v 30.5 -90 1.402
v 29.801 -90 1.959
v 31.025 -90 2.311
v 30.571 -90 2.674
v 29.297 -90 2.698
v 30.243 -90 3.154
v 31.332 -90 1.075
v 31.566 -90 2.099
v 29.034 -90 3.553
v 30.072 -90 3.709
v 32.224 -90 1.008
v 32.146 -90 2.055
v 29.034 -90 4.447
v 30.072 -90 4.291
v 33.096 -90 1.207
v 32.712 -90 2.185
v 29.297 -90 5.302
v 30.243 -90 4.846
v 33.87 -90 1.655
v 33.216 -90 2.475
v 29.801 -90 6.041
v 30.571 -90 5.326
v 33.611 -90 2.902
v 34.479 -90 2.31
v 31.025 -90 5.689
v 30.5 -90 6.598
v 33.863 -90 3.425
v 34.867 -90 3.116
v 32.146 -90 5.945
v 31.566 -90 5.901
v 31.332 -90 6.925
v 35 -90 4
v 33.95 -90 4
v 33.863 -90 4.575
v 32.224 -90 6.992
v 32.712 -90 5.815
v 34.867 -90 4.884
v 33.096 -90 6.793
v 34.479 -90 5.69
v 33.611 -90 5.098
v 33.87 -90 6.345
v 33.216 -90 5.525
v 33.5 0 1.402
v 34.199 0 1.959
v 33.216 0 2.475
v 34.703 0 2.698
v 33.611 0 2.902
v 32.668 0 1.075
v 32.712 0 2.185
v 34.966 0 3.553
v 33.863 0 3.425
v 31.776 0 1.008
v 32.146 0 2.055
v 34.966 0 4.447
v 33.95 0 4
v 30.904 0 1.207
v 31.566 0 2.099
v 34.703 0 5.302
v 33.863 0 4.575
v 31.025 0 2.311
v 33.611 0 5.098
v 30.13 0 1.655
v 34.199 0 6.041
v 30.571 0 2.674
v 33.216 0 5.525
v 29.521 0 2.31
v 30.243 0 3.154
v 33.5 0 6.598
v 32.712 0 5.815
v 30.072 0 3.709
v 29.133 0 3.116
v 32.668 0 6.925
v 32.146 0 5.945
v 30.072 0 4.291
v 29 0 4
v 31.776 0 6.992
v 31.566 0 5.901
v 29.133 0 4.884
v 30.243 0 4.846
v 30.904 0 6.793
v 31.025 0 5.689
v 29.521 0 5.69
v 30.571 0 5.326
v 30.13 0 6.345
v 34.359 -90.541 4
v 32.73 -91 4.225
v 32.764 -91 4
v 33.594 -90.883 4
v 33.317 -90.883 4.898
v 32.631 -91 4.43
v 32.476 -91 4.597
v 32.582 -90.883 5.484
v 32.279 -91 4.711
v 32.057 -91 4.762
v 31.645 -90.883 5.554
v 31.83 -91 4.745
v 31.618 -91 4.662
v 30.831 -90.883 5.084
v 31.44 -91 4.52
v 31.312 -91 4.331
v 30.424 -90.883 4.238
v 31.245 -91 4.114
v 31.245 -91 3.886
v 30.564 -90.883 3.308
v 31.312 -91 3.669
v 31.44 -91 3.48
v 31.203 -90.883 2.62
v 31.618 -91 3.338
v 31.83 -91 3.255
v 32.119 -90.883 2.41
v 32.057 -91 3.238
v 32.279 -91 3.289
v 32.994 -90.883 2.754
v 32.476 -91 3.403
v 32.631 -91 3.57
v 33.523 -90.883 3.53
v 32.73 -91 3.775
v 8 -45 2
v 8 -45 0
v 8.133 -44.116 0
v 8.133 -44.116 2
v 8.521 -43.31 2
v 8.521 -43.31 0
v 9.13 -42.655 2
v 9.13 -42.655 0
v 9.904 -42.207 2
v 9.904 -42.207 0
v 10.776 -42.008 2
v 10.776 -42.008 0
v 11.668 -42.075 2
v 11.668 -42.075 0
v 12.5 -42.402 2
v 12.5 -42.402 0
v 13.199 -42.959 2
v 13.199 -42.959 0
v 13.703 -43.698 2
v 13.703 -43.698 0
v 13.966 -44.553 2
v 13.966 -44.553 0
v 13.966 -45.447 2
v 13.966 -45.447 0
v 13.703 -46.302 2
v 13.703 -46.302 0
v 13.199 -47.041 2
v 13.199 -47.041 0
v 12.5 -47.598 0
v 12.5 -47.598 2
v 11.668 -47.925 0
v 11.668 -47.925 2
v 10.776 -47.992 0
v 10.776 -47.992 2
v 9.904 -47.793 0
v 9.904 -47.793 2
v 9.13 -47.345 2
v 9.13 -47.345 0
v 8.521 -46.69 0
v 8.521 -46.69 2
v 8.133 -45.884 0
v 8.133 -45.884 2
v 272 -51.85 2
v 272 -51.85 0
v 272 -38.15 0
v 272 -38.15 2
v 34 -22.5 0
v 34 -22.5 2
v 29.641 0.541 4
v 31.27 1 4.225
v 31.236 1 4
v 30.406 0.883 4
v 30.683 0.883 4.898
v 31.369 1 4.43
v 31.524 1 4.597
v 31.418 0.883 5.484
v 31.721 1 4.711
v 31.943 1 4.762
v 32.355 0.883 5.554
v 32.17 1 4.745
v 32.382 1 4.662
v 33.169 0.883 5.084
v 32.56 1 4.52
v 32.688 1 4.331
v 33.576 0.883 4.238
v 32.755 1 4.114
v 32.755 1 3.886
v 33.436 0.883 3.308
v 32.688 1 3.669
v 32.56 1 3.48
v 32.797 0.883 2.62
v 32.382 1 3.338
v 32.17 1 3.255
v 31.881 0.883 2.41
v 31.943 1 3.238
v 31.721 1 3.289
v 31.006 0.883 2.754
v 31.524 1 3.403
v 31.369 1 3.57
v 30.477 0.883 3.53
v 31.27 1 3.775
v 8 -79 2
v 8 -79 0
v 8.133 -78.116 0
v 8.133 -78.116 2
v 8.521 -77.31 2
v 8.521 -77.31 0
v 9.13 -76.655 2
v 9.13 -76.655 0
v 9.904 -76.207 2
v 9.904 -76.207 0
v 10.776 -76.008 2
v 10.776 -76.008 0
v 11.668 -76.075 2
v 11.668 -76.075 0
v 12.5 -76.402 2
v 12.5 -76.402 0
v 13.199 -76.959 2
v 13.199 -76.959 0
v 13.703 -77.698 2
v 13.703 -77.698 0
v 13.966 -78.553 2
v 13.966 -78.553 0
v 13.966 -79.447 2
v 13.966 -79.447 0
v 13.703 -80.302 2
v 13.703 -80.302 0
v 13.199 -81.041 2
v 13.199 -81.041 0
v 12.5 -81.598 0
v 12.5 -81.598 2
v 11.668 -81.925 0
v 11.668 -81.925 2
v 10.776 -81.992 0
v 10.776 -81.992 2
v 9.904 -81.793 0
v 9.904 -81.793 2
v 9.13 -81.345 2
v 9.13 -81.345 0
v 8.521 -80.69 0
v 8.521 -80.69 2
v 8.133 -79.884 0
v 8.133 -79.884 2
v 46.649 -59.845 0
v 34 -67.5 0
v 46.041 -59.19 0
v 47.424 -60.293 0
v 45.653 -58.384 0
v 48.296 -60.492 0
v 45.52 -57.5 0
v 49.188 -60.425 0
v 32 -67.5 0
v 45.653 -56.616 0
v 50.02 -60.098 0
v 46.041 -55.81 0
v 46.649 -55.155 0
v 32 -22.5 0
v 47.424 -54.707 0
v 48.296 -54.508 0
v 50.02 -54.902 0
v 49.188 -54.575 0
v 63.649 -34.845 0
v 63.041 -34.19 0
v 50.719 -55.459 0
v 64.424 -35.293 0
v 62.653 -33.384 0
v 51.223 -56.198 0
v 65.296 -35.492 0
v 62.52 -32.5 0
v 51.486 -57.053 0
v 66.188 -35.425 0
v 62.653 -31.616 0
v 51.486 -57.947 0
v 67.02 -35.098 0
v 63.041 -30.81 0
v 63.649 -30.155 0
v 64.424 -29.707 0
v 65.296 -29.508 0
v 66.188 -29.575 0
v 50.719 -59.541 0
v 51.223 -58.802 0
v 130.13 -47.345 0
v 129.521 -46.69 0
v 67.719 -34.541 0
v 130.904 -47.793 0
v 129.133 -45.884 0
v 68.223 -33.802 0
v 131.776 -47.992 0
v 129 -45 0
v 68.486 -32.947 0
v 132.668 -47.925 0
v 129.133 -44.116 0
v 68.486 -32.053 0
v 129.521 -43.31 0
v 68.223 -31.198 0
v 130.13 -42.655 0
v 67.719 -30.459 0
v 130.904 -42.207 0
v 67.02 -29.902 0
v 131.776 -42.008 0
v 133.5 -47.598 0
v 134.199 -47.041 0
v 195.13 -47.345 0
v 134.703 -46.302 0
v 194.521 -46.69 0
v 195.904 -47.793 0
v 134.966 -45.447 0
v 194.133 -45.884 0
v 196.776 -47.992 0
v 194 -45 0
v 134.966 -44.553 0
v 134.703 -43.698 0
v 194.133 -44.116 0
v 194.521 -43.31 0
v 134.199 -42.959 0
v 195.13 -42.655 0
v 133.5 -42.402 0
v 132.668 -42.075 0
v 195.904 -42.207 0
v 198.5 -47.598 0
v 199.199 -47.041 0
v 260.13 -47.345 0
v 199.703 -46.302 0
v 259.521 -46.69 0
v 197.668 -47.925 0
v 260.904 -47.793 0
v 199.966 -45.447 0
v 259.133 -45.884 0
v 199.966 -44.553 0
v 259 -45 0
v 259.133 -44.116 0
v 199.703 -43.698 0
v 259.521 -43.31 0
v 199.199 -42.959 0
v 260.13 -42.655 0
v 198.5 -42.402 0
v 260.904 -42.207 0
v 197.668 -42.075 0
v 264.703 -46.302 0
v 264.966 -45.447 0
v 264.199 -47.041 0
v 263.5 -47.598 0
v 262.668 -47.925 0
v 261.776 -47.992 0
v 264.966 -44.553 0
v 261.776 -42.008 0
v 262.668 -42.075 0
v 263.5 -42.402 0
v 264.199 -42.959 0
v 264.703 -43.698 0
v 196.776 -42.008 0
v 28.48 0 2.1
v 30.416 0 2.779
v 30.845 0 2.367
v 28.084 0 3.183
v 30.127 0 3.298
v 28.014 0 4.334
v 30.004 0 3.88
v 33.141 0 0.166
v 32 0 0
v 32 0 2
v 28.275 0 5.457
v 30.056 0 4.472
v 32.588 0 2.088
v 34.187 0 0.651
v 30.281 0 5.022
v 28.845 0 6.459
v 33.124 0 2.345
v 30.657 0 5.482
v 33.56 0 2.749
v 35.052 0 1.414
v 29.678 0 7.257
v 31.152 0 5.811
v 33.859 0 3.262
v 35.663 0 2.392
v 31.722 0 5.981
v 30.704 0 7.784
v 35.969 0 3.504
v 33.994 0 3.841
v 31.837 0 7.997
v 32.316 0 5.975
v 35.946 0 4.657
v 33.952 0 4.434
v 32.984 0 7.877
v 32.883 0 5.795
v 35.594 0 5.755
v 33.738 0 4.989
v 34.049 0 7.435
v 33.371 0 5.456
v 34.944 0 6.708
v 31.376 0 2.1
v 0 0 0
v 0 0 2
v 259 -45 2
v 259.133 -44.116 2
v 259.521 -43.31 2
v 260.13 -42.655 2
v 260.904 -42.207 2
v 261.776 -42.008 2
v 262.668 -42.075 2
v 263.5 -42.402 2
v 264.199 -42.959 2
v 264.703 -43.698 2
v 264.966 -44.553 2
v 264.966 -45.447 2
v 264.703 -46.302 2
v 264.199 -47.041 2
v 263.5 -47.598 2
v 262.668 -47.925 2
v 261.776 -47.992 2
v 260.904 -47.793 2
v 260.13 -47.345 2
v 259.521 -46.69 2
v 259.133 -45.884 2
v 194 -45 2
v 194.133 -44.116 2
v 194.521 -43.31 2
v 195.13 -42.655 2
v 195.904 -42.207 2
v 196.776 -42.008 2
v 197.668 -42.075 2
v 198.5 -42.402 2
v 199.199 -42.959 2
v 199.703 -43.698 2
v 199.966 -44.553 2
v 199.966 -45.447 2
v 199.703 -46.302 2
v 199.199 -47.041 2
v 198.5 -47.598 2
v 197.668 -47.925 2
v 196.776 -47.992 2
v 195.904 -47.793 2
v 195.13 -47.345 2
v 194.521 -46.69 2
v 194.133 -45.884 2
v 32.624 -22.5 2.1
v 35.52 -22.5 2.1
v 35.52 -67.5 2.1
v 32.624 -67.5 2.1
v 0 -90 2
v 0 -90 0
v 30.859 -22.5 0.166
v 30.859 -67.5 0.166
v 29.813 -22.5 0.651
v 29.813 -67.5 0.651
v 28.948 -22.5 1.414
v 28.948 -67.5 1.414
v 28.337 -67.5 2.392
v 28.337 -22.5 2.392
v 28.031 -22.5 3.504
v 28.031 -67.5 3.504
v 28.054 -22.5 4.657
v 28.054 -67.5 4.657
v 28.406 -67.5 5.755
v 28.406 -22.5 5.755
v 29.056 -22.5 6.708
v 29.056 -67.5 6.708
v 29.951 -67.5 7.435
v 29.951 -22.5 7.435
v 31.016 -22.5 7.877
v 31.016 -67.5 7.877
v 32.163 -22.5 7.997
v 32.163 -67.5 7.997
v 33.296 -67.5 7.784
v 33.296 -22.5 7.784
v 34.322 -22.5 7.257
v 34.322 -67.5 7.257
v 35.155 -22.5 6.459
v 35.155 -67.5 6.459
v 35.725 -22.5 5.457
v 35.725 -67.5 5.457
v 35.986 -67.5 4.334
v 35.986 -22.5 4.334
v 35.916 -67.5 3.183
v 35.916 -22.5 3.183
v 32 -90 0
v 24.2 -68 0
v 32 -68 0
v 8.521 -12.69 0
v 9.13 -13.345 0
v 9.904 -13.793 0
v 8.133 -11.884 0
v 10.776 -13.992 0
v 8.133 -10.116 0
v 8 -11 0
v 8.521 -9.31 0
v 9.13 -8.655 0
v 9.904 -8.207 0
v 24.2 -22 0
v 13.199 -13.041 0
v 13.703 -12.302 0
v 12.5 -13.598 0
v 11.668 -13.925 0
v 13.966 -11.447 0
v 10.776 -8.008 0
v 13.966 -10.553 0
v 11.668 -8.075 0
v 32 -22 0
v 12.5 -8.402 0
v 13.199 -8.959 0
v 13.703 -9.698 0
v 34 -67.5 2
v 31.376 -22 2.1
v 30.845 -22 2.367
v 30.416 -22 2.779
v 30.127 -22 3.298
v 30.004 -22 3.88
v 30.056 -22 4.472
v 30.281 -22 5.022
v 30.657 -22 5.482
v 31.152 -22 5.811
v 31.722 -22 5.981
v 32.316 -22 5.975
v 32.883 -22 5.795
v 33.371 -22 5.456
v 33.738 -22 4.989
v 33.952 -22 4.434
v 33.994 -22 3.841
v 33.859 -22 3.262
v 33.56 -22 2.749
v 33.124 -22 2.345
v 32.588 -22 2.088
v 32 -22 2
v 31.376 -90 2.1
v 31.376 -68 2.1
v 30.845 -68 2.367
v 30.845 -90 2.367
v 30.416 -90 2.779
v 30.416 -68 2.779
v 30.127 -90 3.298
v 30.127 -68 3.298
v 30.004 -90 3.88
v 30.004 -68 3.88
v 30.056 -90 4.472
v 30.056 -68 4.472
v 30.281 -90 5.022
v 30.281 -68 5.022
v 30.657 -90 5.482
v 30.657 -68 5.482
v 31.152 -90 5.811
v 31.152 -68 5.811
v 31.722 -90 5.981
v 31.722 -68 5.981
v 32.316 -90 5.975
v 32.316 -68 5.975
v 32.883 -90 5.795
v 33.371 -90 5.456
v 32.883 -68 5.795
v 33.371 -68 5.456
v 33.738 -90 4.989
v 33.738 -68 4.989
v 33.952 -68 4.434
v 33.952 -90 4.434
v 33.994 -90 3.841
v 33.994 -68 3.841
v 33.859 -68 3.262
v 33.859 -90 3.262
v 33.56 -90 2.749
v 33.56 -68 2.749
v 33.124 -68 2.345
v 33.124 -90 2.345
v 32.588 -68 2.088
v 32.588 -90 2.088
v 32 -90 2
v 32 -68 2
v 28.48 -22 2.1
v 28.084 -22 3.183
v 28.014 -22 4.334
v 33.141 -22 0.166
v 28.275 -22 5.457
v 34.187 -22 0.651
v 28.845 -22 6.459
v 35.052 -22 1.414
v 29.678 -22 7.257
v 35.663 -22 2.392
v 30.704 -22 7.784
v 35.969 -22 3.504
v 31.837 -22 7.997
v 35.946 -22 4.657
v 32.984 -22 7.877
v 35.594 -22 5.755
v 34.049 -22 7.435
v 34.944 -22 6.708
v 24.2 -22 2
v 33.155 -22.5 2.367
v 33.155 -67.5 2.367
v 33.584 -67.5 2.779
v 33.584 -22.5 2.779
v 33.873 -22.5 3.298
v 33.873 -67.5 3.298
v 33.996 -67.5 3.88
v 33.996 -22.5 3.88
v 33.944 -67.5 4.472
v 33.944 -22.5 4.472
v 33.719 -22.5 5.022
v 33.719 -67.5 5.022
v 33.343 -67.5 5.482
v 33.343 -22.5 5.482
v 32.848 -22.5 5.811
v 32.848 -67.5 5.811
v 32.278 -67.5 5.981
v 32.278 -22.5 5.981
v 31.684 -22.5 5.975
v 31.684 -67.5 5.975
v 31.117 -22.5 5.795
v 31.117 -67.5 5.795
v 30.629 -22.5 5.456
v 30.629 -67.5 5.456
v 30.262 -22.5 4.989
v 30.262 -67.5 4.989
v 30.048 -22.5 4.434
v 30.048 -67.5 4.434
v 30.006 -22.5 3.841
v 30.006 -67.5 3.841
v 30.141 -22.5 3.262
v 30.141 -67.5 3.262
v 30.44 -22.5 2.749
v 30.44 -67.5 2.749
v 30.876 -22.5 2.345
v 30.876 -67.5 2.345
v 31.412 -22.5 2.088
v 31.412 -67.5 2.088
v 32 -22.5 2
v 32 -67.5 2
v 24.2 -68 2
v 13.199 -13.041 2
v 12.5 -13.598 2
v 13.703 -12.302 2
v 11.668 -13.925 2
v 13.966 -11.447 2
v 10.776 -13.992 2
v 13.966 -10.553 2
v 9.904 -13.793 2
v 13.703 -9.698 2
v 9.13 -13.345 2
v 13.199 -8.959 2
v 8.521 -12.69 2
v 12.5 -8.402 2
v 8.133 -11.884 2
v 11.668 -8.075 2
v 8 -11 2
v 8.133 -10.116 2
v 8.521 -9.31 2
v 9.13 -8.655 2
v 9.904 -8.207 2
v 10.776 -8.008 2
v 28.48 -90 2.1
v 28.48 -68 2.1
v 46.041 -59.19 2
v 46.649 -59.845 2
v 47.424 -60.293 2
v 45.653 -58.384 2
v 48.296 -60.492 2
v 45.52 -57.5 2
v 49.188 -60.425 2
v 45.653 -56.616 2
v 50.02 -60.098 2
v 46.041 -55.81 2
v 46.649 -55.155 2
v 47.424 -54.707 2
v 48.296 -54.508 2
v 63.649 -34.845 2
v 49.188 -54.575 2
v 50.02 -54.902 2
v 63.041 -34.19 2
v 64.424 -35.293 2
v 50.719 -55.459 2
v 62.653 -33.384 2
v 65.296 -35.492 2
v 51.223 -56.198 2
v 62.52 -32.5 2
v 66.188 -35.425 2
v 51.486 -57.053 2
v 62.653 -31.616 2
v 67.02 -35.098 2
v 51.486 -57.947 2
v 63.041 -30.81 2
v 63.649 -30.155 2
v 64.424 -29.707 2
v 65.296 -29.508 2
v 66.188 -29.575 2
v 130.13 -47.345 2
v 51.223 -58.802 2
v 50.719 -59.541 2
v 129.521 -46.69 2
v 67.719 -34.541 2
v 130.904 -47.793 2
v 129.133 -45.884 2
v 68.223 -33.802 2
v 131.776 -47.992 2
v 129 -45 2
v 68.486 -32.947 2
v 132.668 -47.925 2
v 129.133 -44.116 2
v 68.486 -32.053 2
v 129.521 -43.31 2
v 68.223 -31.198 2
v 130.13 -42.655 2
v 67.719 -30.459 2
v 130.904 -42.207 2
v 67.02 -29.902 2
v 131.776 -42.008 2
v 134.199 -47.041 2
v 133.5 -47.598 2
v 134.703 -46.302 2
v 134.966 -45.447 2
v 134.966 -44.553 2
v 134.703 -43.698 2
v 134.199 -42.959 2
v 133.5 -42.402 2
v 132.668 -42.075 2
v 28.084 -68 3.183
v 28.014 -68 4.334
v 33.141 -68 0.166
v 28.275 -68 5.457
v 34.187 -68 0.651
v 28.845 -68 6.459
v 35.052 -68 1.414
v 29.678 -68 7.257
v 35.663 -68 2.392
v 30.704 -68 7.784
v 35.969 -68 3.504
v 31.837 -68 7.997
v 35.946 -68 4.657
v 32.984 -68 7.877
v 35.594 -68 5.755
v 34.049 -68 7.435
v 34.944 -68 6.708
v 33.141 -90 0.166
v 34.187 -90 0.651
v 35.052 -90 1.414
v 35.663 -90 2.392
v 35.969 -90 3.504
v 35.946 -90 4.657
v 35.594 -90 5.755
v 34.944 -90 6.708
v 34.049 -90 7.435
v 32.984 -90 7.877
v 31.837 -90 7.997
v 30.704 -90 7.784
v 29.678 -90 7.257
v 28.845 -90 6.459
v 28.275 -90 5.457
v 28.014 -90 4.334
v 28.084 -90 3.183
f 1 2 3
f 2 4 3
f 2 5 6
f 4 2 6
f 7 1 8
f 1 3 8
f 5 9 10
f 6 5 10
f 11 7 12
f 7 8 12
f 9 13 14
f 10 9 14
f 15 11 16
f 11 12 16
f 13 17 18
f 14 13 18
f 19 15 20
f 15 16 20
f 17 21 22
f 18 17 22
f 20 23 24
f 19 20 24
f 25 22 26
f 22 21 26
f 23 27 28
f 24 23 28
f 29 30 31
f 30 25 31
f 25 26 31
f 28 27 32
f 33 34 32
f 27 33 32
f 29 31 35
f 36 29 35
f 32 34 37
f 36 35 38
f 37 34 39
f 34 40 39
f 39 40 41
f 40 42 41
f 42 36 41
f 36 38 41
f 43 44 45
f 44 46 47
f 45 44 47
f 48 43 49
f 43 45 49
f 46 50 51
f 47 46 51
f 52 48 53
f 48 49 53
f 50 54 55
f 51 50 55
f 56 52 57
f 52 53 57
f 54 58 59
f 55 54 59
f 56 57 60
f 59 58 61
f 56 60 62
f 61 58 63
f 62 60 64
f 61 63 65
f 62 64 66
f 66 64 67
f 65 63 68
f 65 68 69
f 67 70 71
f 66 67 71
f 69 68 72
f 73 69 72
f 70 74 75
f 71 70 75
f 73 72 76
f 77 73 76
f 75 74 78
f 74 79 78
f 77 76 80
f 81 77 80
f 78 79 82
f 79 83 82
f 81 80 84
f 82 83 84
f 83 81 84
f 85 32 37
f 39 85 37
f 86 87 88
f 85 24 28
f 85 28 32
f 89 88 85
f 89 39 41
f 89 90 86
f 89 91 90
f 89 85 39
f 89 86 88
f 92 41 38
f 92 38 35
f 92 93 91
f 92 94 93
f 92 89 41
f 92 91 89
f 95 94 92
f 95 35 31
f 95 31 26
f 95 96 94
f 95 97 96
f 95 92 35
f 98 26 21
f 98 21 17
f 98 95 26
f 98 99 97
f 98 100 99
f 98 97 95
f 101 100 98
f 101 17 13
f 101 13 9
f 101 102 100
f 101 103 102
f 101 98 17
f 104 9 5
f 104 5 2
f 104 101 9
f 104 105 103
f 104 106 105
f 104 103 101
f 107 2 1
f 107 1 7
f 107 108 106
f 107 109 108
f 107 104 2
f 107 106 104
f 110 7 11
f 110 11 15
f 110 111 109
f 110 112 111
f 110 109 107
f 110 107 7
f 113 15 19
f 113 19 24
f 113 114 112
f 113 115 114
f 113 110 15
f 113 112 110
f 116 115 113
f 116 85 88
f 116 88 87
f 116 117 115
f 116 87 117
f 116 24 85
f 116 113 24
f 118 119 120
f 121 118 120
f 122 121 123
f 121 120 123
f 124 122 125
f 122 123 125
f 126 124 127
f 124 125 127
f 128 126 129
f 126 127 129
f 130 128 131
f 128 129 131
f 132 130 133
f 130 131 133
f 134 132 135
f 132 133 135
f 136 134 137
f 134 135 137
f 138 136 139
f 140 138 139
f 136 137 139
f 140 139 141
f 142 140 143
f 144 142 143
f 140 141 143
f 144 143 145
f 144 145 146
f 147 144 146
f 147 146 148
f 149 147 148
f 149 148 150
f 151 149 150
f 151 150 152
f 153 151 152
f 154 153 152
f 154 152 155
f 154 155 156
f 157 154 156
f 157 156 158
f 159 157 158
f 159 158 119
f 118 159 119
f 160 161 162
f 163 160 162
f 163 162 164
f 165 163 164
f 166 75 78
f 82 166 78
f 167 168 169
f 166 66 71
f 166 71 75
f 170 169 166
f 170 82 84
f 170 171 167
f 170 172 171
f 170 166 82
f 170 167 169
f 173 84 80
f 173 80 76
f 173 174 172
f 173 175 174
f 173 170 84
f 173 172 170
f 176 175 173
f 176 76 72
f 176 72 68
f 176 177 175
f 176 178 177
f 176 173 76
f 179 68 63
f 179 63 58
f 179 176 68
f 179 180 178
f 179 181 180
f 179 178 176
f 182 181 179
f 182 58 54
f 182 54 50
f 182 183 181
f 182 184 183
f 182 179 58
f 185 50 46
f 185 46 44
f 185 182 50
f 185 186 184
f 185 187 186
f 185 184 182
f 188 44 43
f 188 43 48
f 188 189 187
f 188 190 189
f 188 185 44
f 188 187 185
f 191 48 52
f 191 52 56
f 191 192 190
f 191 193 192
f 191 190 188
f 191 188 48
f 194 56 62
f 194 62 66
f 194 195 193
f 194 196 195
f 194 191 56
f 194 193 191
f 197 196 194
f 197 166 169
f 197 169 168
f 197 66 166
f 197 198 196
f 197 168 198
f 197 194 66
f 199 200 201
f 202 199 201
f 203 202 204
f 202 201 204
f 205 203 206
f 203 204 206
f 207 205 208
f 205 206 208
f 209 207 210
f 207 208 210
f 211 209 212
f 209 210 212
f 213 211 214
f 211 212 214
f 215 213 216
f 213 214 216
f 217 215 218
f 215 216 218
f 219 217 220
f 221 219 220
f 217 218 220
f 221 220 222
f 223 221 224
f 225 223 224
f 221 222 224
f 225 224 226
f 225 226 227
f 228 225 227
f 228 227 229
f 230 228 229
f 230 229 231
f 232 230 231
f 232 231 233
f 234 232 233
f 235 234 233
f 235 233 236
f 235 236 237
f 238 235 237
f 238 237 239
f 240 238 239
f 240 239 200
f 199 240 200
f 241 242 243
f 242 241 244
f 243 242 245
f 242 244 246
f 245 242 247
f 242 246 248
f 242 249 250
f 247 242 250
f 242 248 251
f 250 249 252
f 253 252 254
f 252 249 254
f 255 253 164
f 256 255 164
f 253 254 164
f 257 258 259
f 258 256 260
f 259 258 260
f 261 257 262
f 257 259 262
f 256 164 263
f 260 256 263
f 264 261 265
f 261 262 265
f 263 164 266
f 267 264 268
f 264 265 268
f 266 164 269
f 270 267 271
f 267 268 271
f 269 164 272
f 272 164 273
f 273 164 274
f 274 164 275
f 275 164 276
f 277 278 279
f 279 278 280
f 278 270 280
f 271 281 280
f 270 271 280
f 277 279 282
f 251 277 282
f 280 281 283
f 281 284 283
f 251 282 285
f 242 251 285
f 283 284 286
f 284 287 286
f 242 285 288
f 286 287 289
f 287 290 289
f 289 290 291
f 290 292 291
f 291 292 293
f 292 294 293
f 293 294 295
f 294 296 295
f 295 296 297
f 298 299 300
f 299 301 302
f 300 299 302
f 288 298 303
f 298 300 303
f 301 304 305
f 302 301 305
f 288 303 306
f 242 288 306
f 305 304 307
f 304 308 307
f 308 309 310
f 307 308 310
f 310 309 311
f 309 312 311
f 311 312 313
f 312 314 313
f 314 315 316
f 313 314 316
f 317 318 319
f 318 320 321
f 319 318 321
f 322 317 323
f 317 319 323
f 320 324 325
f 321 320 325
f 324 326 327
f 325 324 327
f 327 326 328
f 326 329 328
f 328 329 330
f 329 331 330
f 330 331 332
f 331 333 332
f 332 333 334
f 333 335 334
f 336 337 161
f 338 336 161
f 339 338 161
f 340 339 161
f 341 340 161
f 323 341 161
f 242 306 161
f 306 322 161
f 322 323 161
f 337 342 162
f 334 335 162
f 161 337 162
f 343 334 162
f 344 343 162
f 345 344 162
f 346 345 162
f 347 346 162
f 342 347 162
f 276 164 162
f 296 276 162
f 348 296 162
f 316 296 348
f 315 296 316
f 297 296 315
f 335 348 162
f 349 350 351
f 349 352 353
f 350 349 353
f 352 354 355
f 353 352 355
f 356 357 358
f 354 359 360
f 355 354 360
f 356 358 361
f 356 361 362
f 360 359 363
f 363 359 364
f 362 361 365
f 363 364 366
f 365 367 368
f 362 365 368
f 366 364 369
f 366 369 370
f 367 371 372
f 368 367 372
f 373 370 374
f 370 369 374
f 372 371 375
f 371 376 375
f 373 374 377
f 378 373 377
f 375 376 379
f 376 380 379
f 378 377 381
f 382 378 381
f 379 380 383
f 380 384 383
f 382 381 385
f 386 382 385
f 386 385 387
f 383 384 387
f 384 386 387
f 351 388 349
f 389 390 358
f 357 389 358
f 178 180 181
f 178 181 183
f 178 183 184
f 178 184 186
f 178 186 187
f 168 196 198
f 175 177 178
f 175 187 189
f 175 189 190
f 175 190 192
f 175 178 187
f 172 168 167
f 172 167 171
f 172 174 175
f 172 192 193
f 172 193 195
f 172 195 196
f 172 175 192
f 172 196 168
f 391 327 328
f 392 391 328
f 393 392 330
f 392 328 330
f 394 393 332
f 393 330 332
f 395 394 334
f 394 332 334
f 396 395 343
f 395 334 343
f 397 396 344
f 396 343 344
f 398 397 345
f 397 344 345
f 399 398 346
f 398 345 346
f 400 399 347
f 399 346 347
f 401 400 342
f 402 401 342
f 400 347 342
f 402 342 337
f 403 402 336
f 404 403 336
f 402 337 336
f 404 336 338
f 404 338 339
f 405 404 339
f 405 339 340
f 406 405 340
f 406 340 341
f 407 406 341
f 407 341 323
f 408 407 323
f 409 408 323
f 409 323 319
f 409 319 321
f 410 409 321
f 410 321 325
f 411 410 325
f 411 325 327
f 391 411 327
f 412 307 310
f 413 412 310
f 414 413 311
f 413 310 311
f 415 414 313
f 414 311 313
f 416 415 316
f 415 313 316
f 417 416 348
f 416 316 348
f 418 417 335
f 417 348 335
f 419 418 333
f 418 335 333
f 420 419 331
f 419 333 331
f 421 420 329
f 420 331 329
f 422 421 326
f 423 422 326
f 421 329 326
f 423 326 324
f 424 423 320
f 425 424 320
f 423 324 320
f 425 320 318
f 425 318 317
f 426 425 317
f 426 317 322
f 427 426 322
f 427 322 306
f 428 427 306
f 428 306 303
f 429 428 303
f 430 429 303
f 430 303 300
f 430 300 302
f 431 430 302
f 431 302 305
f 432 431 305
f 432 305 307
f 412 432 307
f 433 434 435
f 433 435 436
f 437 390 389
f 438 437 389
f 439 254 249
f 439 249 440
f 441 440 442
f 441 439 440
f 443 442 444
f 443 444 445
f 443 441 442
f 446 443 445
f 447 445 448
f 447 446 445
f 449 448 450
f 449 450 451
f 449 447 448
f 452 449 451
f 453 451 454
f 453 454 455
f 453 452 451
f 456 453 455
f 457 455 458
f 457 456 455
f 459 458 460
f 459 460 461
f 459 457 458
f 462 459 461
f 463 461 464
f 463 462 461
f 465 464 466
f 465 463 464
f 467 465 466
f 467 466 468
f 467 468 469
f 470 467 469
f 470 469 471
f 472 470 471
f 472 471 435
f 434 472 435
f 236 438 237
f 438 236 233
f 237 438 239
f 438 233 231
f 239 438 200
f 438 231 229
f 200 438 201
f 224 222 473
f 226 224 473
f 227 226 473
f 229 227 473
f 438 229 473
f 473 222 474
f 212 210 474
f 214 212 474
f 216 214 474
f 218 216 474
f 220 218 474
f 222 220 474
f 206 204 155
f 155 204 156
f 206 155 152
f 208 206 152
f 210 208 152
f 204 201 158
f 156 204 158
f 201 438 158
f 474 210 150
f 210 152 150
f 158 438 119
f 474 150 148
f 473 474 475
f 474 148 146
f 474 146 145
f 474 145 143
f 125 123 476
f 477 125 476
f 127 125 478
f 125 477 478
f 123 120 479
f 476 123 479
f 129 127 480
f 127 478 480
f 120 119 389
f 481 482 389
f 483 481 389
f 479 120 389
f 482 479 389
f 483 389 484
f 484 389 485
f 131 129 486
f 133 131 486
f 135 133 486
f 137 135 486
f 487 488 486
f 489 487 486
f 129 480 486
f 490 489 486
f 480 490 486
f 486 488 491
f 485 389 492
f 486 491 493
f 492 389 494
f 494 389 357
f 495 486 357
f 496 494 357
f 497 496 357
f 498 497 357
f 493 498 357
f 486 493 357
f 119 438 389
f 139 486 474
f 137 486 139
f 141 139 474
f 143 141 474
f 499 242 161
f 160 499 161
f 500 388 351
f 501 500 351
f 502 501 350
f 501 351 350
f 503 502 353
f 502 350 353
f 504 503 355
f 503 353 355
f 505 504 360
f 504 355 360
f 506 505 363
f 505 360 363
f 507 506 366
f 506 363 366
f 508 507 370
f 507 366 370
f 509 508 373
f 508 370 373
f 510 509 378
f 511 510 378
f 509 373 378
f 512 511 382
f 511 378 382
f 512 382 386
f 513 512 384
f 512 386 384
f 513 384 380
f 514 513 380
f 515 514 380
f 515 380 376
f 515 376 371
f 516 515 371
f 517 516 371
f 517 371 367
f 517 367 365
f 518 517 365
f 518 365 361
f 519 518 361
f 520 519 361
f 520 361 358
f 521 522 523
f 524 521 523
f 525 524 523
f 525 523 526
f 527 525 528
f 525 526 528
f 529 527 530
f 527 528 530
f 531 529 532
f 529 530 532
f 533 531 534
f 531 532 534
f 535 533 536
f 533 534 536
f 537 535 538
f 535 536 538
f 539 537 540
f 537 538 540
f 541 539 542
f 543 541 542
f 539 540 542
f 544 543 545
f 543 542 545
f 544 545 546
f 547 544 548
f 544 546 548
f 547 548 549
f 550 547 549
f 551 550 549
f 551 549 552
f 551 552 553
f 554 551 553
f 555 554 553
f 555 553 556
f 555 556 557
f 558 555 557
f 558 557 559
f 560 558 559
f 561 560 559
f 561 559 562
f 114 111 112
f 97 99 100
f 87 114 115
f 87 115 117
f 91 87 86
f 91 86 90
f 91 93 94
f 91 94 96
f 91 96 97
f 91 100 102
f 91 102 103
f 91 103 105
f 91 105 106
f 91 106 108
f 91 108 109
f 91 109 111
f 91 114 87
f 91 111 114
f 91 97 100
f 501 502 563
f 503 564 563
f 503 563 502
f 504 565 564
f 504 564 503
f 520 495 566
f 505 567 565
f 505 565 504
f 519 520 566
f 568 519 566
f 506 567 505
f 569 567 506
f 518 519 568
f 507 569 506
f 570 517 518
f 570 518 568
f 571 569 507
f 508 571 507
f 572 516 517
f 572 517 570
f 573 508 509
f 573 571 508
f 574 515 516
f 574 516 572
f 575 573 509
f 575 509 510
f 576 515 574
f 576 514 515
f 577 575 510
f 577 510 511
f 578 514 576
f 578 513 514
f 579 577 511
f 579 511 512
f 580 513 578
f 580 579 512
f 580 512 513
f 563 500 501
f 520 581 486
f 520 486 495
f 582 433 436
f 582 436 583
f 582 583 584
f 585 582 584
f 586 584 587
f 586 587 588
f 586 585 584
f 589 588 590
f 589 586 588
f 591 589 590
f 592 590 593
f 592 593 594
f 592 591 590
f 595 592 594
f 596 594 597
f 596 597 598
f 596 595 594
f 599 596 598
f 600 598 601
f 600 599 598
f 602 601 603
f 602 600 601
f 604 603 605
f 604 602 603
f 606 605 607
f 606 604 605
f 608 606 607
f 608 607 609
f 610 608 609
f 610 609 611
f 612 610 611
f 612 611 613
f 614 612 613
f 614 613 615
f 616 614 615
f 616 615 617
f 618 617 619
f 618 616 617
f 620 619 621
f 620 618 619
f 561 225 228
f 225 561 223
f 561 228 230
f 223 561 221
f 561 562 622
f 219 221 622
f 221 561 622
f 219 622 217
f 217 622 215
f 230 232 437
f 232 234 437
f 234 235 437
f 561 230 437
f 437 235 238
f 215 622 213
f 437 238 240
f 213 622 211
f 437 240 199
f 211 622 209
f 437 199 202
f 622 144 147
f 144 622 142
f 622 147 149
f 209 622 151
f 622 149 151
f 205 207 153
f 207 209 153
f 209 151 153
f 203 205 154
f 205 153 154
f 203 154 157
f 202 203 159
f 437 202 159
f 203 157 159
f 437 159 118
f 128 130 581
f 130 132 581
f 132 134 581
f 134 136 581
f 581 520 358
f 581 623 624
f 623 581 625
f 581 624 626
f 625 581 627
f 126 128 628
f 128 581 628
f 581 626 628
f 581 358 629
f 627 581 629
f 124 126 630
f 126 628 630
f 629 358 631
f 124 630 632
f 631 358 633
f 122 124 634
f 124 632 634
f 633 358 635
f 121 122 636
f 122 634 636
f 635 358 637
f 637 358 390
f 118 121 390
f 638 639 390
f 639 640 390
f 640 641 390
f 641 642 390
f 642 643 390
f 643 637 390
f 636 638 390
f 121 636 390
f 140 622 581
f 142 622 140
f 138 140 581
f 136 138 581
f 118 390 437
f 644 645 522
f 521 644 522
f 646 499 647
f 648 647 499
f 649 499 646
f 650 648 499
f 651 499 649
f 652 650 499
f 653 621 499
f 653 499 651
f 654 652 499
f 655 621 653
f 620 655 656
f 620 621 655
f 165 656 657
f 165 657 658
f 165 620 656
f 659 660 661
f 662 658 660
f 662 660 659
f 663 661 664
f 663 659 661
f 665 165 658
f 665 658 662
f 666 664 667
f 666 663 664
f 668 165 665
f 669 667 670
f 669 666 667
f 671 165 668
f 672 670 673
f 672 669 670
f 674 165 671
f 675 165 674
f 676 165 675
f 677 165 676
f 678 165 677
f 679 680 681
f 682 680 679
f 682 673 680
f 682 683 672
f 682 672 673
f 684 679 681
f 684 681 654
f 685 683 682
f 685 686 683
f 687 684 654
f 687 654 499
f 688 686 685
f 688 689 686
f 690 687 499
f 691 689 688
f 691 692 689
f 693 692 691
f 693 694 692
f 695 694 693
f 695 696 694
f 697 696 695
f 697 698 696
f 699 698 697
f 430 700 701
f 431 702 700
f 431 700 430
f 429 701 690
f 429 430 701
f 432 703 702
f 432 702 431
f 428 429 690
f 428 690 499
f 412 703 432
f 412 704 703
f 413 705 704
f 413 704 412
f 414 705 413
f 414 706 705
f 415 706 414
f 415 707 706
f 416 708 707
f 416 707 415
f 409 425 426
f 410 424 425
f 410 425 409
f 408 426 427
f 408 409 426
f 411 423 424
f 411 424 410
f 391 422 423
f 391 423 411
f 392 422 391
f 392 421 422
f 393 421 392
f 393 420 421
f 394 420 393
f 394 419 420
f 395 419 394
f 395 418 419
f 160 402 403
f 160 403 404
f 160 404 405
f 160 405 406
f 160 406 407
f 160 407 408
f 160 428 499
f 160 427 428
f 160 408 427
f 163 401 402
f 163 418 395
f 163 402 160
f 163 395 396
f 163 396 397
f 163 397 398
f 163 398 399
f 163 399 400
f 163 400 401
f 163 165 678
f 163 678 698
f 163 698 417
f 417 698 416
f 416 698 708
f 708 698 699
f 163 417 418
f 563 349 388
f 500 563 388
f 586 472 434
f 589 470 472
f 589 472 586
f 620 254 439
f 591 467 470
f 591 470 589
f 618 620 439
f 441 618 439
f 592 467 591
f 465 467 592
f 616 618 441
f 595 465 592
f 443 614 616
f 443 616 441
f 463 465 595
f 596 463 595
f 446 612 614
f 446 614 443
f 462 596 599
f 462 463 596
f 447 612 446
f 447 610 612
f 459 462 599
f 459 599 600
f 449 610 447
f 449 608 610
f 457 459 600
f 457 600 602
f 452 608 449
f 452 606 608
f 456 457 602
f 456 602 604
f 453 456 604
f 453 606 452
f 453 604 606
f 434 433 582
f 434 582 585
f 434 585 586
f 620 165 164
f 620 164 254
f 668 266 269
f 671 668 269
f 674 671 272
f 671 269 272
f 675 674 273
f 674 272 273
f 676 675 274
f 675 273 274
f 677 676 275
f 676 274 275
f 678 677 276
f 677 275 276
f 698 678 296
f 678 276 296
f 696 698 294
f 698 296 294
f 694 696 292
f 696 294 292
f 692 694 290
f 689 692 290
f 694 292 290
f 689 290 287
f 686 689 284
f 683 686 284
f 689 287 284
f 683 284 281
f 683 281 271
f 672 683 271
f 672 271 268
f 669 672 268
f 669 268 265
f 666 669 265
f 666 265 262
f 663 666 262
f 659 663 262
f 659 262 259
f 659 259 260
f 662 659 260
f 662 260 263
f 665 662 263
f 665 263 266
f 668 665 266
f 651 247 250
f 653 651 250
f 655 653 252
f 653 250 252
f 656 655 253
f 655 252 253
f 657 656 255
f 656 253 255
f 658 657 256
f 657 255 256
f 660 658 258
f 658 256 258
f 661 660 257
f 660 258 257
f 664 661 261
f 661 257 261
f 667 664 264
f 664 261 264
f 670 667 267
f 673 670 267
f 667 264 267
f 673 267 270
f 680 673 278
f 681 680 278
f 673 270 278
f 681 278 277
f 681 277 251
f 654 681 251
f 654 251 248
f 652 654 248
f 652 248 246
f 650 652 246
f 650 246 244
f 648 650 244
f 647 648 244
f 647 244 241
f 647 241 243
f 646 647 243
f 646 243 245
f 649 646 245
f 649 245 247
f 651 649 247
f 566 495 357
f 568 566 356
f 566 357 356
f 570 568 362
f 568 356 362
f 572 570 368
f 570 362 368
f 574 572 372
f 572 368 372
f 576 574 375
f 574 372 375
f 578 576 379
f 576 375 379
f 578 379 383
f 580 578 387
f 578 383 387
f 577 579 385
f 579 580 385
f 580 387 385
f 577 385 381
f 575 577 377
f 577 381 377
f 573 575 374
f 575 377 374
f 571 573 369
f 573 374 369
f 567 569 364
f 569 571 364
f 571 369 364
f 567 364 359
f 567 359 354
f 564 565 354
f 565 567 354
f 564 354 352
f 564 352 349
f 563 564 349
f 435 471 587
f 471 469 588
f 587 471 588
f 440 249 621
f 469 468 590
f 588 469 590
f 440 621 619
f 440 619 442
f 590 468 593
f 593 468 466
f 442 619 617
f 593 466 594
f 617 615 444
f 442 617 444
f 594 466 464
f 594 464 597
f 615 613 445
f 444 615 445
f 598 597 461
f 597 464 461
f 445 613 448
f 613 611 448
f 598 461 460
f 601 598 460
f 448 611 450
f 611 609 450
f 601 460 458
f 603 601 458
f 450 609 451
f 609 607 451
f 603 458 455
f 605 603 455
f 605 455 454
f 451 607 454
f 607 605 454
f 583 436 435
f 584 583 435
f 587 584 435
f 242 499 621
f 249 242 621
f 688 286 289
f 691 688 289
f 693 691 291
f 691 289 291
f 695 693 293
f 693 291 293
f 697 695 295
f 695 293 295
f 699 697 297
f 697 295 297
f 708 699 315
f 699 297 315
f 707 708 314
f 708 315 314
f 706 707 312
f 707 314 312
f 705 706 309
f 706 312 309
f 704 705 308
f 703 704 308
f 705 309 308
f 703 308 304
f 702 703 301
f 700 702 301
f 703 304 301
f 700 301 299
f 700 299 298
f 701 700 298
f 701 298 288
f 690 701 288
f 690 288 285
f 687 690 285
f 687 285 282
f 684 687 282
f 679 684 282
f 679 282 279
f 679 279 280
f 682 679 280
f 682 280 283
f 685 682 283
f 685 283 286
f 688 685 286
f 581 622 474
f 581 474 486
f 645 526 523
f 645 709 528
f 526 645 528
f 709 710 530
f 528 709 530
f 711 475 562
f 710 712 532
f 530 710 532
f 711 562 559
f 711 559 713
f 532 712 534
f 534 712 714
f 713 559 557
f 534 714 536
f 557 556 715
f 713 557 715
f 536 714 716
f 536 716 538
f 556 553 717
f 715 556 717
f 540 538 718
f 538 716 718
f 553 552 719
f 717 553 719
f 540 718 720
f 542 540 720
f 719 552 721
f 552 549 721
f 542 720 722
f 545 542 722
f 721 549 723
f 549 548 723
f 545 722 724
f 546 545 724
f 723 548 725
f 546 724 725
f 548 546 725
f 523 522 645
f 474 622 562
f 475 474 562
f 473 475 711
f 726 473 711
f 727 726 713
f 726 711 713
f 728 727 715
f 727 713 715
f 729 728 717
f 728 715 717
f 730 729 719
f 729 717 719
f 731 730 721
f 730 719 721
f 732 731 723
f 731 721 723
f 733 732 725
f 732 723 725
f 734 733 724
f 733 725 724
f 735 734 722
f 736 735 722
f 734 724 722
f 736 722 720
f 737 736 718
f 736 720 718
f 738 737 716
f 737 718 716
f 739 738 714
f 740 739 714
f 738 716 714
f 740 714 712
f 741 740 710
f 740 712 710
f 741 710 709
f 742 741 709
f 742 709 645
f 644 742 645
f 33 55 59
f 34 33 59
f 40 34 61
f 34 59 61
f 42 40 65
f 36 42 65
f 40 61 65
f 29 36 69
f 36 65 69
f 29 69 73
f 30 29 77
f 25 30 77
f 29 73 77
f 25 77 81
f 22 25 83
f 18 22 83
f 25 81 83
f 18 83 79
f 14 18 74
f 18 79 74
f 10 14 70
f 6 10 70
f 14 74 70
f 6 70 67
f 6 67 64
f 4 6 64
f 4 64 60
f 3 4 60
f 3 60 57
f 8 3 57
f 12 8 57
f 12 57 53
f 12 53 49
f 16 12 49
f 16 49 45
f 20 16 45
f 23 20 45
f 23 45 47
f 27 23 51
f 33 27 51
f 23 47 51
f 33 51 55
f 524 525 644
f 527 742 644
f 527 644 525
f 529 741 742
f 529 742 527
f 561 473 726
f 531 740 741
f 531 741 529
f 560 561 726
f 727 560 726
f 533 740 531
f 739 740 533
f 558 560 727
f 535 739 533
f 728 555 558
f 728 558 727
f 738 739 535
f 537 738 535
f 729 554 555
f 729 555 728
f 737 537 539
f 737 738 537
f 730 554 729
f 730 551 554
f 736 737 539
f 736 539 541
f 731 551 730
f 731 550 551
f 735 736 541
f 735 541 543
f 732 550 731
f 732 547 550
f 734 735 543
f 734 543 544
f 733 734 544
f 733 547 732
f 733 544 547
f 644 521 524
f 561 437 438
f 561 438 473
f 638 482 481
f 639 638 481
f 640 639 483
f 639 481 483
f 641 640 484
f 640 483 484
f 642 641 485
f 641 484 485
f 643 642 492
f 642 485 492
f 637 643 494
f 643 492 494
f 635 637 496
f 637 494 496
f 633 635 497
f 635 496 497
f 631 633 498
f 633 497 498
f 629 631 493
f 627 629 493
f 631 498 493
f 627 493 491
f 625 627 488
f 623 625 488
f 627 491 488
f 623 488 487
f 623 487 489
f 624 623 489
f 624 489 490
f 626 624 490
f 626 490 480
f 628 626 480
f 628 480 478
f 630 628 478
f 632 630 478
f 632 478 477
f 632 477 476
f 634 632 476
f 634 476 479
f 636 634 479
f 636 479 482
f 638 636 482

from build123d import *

# Parameters (mm, degrees)
F2_DEPTH  = 90
F3_W      = 67.9701848628
F3_H      = 46
F4_DEPTH  = 12.5
F6_D      = 6
F7_R      = 1.95
F8_DEPTH  = 90
F9_R      = 3
F10_DEPTH = 1
F12_R     = 3
F13_DEPTH = 1
F16_DEPTH = 2
F18_DEPTH = 45
F20_D     = 6


# Not quite as in the source:
# - a fillet or chamfer that OpenCascade refuses, or shapes differently, is made with other operations: its cross-section is extruded or revolved along the edge and cut away or added


with BuildPart() as f2:
    # F1 (on Front) → F2 (new body)
    with BuildSketch(Plane.XZ):
        with BuildLine():
            Line((0, 2), (0, 0))
            Line((0, 0), (32, 0))
            ThreePointArc((32, 0), (34.0493901532, 7.4351128075), (28.4800568186, 2.1))
            Line((28.4800568186, 2.1), (31.3755002002, 2.1))
            ThreePointArc((31.3755002002, 2.1), (32.316227766, 5.9748417658), (32, 2))
            Line((32, 2), (0, 2))
        make_face()
    extrude(amount=F2_DEPTH)

    # F3 (on face) → F4 (cut, symmetric)
    with BuildSketch(Plane.XY.offset(2)):
        with Locations((58.1850924314, -45)):
            Rectangle(F3_W, F3_H)
    extrude(amount=F4_DEPTH, both=True, mode=Mode.SUBTRACT)

    # F6 (through all)
    with Locations(Plane.XY.offset(2)):
        with Locations((11, -11), (11, -45), (11, -79)):
            Hole(F6_D / 2)


with BuildPart() as f8:
    # F7 (on Front) → F8 (new body)
    with BuildSketch(Plane.XZ):
        with Locations((32, 4)):
            Circle(F7_R)
    extrude(amount=F8_DEPTH)

    # F9 (on face) → F10 (join)
    with BuildSketch(Plane(origin=(0, 0, 0), x_dir=(-1, 0, 0), z_dir=(0, 1, 0))):
        with Locations((-32, 4)):
            Circle(F9_R)
    extrude(amount=F10_DEPTH)

    # F11: fillet of radius 3 on 1 edges, made by hand

    # F11_s1 → F11_t2 (revolve, cut)
    with BuildSketch(Plane.XY.offset(4)):
        with BuildLine():
            ThreePointArc((29, 0), (30.0113231061, 0.7386127875), (31.2360679775, 1))
            Line((31.2360679775, 1), (29, 1))
            Line((29, 1), (29, 0))
        make_face()
    revolve(axis=Axis((32, 1, 4), (0, 1, 0)), mode=Mode.SUBTRACT)

    # F12 (on face) → F13 (join)
    with BuildSketch(Plane.XZ.offset(90)):
        with Locations((32, 4)):
            Circle(F12_R)
    extrude(amount=F13_DEPTH)

    # F14: fillet of radius 3 on 1 edges, made by hand

    # F14_s1 → F14_t2 (revolve, cut)
    with BuildSketch(Plane.XY.offset(4)):
        with BuildLine():
            ThreePointArc((35, -90), (33.9886768939, -90.7386127875), (32.7639320225, -91))
            Line((32.7639320225, -91), (35, -91))
            Line((35, -91), (35, -90))
        make_face()
    revolve(axis=Axis((32, -91, 4), (0, -1, 0)), mode=Mode.SUBTRACT)


with BuildPart() as f16:
    # F15 (on Top) → F16 (new body)
    with BuildSketch(Plane.XY):
        Polygon((272, -38.15), (34, -22.5), (32, -22.5), (32, -67.5), (34, -67.5), (272, -51.85), align=None)
    extrude(amount=F16_DEPTH)

    # F17 (on face) → F18 (join)
    with BuildSketch(Plane(origin=(0, -22.5, 0), x_dir=(-1, 0, 0), z_dir=(0, 1, 0))):
        with BuildLine():
            Line((-32, 2), (-32, 0))
            ThreePointArc((-32, 0), (-29.9506098468, 7.4351128075), (-35.5199431814, 2.1))
            Line((-35.5199431814, 2.1), (-32.6244997998, 2.1))
            ThreePointArc((-32.6244997998, 2.1), (-31.683772234, 5.9748417658), (-32, 2))
        make_face()
    extrude(amount=-F18_DEPTH)

    # F20 (through all)
    with Locations(Plane.XY.offset(2)):
        with Locations((48.5199431814, -57.5), (65.5199431814, -32.5), (197, -45), (132, -45), (262, -45)):
            Hole(F20_D / 2)


solid = Compound([f2.part, f8.part, f16.part])
